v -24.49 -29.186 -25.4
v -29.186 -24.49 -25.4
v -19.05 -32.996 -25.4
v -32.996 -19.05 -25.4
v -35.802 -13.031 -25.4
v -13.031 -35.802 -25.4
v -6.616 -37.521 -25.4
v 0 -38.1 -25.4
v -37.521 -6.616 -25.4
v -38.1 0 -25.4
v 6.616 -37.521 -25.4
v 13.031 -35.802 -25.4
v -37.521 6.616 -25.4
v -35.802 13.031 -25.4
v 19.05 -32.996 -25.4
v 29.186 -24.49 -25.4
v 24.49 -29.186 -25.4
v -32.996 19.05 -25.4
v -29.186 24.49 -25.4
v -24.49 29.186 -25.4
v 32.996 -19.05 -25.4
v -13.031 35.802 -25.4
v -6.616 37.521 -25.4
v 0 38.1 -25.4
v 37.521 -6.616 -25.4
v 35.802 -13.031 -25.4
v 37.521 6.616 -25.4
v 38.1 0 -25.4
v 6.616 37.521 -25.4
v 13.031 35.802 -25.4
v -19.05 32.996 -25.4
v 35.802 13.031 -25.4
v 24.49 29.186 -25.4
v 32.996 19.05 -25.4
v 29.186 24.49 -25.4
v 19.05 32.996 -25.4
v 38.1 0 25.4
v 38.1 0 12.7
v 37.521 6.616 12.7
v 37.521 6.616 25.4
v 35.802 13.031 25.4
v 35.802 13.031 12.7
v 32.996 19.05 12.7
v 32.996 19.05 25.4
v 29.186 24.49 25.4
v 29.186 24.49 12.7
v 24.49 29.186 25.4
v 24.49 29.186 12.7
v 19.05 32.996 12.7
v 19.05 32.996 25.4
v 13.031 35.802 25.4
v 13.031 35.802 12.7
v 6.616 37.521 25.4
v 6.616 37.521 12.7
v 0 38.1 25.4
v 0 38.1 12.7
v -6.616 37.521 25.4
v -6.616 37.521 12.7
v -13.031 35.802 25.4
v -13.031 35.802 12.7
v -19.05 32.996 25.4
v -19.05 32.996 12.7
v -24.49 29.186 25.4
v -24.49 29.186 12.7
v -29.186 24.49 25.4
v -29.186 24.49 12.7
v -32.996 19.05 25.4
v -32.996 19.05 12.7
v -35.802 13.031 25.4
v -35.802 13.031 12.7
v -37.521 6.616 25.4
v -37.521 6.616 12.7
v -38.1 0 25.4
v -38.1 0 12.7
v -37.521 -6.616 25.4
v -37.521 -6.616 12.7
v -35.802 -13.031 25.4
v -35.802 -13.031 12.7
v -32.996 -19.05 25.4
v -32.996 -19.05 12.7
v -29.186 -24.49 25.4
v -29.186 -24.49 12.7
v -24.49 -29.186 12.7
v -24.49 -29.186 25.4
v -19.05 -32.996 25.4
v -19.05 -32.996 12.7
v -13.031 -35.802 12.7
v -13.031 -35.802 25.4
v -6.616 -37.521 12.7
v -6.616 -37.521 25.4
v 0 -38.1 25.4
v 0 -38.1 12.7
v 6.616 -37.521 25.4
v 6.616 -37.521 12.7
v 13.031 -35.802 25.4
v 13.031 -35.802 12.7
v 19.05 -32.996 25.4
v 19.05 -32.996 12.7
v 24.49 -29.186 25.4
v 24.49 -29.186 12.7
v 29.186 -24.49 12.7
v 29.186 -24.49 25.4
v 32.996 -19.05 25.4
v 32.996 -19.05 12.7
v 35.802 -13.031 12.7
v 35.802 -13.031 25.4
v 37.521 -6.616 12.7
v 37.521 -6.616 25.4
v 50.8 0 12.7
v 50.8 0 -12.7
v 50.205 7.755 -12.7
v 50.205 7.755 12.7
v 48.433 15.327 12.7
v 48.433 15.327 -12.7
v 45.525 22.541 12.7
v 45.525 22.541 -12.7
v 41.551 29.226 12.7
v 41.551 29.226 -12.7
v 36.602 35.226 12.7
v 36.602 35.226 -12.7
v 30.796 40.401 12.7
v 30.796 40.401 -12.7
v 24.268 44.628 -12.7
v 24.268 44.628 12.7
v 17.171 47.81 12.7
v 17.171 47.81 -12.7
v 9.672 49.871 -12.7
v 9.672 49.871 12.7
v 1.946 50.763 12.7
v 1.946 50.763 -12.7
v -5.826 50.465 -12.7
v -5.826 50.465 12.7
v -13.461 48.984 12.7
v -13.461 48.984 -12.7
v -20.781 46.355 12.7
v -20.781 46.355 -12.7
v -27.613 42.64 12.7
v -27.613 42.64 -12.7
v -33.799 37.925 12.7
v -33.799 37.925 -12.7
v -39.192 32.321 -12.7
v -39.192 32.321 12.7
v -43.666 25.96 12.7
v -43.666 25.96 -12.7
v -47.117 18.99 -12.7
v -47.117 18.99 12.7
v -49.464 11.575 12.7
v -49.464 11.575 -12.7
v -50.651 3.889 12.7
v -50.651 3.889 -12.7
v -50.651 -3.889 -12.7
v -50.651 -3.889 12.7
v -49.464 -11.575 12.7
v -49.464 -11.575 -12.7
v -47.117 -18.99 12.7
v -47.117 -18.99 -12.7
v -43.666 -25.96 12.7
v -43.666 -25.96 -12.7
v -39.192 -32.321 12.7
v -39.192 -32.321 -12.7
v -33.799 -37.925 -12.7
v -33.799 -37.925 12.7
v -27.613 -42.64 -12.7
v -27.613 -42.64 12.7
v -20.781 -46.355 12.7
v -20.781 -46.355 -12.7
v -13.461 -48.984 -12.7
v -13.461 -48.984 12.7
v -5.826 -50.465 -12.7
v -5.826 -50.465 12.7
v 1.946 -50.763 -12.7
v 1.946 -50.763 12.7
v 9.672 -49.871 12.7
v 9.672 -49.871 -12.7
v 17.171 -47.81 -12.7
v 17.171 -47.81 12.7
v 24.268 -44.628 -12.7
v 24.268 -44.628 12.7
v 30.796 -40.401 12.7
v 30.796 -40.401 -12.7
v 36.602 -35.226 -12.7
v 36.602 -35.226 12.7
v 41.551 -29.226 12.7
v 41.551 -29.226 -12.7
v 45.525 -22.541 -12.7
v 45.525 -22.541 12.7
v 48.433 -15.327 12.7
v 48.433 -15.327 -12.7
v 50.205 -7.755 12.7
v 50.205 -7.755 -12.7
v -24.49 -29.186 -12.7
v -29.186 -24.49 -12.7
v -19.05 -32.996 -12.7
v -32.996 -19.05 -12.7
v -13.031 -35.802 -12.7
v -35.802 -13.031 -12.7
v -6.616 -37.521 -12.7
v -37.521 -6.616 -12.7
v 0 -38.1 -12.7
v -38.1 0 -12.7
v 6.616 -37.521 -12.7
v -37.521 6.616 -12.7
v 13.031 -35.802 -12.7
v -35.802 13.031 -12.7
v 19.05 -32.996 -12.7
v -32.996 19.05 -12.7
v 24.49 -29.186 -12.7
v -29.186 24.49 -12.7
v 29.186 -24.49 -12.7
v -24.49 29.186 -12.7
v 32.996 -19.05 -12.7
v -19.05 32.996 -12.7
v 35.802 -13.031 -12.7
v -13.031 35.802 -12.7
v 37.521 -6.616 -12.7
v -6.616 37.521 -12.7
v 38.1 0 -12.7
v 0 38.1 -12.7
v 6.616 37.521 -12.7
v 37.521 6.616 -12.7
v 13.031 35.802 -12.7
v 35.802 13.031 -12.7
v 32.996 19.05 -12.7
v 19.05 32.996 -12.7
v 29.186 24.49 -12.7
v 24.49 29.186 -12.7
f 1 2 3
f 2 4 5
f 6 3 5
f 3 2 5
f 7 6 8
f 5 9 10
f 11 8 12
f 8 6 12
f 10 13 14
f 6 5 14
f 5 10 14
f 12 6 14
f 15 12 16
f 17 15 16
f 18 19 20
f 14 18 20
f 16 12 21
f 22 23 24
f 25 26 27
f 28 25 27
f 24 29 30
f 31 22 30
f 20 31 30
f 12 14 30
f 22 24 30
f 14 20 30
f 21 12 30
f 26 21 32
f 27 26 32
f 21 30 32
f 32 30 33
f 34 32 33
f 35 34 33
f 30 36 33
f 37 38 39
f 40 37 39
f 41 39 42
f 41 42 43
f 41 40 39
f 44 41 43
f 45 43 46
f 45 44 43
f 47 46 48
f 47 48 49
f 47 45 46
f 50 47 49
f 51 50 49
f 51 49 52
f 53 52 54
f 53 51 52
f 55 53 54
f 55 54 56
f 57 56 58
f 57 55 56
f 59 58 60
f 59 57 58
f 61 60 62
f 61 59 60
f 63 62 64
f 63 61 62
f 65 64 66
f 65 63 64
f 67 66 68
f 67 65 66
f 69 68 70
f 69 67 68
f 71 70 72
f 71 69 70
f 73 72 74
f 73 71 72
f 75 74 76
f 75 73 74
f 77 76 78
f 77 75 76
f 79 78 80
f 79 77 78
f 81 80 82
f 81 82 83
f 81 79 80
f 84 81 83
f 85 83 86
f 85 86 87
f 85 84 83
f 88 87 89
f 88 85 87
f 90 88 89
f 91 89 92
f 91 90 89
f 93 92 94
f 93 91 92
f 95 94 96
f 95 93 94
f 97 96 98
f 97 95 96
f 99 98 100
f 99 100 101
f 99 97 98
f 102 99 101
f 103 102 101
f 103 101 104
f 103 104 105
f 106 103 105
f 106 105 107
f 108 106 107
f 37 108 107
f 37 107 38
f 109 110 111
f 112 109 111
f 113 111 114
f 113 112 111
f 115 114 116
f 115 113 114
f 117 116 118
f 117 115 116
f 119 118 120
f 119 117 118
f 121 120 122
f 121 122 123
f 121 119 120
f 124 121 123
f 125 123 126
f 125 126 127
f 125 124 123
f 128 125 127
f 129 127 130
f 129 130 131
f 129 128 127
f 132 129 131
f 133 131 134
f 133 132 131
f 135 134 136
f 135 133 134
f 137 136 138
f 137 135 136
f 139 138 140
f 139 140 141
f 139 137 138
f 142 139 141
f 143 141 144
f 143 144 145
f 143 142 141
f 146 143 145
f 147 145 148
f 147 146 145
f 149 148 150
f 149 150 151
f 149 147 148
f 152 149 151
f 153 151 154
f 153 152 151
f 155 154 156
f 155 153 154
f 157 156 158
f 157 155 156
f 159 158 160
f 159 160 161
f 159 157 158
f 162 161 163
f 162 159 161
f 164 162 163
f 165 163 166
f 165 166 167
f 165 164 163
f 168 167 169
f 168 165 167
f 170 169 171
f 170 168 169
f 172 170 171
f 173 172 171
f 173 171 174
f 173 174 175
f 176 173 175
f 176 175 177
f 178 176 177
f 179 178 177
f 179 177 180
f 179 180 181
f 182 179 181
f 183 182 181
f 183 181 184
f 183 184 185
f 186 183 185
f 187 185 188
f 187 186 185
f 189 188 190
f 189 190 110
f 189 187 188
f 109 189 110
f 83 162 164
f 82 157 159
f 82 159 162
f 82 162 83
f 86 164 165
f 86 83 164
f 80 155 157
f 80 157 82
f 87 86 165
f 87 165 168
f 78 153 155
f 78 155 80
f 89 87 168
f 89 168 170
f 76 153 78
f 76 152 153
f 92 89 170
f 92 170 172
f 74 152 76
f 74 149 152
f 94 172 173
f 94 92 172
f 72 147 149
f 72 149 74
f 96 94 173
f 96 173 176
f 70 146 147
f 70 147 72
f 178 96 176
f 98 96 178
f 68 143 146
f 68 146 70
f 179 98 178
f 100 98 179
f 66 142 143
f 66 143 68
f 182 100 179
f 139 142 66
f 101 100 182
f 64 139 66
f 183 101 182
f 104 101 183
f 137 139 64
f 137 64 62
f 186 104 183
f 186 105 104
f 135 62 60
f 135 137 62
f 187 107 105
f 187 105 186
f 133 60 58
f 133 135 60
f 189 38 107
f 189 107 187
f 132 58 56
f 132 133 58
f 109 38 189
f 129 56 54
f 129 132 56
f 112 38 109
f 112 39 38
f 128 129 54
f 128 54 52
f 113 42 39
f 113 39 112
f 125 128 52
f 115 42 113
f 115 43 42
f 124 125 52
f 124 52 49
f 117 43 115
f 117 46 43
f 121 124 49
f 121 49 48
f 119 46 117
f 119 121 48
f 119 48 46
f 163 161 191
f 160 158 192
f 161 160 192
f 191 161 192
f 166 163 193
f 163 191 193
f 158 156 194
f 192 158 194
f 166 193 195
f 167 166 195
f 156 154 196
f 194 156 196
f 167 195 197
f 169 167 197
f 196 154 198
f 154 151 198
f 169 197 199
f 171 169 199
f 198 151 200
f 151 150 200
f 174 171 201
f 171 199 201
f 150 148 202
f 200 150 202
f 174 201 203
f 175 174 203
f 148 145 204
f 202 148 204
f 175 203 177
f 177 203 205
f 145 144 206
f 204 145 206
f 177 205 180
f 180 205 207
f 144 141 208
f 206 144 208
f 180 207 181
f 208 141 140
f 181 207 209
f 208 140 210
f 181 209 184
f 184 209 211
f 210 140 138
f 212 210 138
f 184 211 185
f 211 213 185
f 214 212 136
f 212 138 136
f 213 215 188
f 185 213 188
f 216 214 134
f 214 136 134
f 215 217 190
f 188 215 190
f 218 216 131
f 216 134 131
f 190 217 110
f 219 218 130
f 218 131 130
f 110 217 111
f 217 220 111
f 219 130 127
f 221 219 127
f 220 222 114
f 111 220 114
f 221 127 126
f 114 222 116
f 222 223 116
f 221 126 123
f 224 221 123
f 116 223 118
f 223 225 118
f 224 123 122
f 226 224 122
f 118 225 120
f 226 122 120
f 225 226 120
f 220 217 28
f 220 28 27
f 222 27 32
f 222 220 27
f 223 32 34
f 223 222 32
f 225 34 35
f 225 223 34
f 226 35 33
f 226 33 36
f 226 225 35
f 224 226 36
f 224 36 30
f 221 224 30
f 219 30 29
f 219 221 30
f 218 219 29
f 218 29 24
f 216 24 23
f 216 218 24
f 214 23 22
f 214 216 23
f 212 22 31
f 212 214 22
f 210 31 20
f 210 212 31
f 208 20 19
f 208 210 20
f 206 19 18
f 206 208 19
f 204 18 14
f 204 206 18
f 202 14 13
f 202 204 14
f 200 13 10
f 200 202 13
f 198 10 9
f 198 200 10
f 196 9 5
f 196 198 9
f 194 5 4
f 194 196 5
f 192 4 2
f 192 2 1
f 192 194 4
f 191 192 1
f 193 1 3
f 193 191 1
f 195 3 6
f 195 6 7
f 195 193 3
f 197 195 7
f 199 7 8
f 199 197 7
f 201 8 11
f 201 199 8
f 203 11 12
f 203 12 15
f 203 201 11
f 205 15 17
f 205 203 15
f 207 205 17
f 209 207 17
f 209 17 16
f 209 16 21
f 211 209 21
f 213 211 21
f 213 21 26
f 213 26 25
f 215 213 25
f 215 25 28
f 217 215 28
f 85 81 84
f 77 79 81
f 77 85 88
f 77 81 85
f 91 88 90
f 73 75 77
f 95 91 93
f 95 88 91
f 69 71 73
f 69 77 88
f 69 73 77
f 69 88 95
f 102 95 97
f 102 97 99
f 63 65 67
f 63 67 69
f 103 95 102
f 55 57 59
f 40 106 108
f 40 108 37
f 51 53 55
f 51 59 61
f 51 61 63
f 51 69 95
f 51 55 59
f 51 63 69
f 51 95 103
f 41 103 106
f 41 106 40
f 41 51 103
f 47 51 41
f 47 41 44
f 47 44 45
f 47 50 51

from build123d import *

# Parameters (mm, degrees)
F0_R     = 38.1
F1_DEPTH = 25.4
F0_R_2   = 50.8
F2_DEPTH = 12.7


with BuildPart() as f1:
    # F0 (on Top) → F1 (new body, symmetric)
    with BuildSketch(Plane.XY):
        Circle(F0_R)
    extrude(amount=F1_DEPTH, both=True)

    # F0 (on Top) → F2 (join, symmetric)
    with BuildSketch(Plane.XY):
        Circle(F0_R_2)
        Circle(F0_R, mode=Mode.SUBTRACT)
    extrude(amount=F2_DEPTH, both=True)


solid = f1.part
